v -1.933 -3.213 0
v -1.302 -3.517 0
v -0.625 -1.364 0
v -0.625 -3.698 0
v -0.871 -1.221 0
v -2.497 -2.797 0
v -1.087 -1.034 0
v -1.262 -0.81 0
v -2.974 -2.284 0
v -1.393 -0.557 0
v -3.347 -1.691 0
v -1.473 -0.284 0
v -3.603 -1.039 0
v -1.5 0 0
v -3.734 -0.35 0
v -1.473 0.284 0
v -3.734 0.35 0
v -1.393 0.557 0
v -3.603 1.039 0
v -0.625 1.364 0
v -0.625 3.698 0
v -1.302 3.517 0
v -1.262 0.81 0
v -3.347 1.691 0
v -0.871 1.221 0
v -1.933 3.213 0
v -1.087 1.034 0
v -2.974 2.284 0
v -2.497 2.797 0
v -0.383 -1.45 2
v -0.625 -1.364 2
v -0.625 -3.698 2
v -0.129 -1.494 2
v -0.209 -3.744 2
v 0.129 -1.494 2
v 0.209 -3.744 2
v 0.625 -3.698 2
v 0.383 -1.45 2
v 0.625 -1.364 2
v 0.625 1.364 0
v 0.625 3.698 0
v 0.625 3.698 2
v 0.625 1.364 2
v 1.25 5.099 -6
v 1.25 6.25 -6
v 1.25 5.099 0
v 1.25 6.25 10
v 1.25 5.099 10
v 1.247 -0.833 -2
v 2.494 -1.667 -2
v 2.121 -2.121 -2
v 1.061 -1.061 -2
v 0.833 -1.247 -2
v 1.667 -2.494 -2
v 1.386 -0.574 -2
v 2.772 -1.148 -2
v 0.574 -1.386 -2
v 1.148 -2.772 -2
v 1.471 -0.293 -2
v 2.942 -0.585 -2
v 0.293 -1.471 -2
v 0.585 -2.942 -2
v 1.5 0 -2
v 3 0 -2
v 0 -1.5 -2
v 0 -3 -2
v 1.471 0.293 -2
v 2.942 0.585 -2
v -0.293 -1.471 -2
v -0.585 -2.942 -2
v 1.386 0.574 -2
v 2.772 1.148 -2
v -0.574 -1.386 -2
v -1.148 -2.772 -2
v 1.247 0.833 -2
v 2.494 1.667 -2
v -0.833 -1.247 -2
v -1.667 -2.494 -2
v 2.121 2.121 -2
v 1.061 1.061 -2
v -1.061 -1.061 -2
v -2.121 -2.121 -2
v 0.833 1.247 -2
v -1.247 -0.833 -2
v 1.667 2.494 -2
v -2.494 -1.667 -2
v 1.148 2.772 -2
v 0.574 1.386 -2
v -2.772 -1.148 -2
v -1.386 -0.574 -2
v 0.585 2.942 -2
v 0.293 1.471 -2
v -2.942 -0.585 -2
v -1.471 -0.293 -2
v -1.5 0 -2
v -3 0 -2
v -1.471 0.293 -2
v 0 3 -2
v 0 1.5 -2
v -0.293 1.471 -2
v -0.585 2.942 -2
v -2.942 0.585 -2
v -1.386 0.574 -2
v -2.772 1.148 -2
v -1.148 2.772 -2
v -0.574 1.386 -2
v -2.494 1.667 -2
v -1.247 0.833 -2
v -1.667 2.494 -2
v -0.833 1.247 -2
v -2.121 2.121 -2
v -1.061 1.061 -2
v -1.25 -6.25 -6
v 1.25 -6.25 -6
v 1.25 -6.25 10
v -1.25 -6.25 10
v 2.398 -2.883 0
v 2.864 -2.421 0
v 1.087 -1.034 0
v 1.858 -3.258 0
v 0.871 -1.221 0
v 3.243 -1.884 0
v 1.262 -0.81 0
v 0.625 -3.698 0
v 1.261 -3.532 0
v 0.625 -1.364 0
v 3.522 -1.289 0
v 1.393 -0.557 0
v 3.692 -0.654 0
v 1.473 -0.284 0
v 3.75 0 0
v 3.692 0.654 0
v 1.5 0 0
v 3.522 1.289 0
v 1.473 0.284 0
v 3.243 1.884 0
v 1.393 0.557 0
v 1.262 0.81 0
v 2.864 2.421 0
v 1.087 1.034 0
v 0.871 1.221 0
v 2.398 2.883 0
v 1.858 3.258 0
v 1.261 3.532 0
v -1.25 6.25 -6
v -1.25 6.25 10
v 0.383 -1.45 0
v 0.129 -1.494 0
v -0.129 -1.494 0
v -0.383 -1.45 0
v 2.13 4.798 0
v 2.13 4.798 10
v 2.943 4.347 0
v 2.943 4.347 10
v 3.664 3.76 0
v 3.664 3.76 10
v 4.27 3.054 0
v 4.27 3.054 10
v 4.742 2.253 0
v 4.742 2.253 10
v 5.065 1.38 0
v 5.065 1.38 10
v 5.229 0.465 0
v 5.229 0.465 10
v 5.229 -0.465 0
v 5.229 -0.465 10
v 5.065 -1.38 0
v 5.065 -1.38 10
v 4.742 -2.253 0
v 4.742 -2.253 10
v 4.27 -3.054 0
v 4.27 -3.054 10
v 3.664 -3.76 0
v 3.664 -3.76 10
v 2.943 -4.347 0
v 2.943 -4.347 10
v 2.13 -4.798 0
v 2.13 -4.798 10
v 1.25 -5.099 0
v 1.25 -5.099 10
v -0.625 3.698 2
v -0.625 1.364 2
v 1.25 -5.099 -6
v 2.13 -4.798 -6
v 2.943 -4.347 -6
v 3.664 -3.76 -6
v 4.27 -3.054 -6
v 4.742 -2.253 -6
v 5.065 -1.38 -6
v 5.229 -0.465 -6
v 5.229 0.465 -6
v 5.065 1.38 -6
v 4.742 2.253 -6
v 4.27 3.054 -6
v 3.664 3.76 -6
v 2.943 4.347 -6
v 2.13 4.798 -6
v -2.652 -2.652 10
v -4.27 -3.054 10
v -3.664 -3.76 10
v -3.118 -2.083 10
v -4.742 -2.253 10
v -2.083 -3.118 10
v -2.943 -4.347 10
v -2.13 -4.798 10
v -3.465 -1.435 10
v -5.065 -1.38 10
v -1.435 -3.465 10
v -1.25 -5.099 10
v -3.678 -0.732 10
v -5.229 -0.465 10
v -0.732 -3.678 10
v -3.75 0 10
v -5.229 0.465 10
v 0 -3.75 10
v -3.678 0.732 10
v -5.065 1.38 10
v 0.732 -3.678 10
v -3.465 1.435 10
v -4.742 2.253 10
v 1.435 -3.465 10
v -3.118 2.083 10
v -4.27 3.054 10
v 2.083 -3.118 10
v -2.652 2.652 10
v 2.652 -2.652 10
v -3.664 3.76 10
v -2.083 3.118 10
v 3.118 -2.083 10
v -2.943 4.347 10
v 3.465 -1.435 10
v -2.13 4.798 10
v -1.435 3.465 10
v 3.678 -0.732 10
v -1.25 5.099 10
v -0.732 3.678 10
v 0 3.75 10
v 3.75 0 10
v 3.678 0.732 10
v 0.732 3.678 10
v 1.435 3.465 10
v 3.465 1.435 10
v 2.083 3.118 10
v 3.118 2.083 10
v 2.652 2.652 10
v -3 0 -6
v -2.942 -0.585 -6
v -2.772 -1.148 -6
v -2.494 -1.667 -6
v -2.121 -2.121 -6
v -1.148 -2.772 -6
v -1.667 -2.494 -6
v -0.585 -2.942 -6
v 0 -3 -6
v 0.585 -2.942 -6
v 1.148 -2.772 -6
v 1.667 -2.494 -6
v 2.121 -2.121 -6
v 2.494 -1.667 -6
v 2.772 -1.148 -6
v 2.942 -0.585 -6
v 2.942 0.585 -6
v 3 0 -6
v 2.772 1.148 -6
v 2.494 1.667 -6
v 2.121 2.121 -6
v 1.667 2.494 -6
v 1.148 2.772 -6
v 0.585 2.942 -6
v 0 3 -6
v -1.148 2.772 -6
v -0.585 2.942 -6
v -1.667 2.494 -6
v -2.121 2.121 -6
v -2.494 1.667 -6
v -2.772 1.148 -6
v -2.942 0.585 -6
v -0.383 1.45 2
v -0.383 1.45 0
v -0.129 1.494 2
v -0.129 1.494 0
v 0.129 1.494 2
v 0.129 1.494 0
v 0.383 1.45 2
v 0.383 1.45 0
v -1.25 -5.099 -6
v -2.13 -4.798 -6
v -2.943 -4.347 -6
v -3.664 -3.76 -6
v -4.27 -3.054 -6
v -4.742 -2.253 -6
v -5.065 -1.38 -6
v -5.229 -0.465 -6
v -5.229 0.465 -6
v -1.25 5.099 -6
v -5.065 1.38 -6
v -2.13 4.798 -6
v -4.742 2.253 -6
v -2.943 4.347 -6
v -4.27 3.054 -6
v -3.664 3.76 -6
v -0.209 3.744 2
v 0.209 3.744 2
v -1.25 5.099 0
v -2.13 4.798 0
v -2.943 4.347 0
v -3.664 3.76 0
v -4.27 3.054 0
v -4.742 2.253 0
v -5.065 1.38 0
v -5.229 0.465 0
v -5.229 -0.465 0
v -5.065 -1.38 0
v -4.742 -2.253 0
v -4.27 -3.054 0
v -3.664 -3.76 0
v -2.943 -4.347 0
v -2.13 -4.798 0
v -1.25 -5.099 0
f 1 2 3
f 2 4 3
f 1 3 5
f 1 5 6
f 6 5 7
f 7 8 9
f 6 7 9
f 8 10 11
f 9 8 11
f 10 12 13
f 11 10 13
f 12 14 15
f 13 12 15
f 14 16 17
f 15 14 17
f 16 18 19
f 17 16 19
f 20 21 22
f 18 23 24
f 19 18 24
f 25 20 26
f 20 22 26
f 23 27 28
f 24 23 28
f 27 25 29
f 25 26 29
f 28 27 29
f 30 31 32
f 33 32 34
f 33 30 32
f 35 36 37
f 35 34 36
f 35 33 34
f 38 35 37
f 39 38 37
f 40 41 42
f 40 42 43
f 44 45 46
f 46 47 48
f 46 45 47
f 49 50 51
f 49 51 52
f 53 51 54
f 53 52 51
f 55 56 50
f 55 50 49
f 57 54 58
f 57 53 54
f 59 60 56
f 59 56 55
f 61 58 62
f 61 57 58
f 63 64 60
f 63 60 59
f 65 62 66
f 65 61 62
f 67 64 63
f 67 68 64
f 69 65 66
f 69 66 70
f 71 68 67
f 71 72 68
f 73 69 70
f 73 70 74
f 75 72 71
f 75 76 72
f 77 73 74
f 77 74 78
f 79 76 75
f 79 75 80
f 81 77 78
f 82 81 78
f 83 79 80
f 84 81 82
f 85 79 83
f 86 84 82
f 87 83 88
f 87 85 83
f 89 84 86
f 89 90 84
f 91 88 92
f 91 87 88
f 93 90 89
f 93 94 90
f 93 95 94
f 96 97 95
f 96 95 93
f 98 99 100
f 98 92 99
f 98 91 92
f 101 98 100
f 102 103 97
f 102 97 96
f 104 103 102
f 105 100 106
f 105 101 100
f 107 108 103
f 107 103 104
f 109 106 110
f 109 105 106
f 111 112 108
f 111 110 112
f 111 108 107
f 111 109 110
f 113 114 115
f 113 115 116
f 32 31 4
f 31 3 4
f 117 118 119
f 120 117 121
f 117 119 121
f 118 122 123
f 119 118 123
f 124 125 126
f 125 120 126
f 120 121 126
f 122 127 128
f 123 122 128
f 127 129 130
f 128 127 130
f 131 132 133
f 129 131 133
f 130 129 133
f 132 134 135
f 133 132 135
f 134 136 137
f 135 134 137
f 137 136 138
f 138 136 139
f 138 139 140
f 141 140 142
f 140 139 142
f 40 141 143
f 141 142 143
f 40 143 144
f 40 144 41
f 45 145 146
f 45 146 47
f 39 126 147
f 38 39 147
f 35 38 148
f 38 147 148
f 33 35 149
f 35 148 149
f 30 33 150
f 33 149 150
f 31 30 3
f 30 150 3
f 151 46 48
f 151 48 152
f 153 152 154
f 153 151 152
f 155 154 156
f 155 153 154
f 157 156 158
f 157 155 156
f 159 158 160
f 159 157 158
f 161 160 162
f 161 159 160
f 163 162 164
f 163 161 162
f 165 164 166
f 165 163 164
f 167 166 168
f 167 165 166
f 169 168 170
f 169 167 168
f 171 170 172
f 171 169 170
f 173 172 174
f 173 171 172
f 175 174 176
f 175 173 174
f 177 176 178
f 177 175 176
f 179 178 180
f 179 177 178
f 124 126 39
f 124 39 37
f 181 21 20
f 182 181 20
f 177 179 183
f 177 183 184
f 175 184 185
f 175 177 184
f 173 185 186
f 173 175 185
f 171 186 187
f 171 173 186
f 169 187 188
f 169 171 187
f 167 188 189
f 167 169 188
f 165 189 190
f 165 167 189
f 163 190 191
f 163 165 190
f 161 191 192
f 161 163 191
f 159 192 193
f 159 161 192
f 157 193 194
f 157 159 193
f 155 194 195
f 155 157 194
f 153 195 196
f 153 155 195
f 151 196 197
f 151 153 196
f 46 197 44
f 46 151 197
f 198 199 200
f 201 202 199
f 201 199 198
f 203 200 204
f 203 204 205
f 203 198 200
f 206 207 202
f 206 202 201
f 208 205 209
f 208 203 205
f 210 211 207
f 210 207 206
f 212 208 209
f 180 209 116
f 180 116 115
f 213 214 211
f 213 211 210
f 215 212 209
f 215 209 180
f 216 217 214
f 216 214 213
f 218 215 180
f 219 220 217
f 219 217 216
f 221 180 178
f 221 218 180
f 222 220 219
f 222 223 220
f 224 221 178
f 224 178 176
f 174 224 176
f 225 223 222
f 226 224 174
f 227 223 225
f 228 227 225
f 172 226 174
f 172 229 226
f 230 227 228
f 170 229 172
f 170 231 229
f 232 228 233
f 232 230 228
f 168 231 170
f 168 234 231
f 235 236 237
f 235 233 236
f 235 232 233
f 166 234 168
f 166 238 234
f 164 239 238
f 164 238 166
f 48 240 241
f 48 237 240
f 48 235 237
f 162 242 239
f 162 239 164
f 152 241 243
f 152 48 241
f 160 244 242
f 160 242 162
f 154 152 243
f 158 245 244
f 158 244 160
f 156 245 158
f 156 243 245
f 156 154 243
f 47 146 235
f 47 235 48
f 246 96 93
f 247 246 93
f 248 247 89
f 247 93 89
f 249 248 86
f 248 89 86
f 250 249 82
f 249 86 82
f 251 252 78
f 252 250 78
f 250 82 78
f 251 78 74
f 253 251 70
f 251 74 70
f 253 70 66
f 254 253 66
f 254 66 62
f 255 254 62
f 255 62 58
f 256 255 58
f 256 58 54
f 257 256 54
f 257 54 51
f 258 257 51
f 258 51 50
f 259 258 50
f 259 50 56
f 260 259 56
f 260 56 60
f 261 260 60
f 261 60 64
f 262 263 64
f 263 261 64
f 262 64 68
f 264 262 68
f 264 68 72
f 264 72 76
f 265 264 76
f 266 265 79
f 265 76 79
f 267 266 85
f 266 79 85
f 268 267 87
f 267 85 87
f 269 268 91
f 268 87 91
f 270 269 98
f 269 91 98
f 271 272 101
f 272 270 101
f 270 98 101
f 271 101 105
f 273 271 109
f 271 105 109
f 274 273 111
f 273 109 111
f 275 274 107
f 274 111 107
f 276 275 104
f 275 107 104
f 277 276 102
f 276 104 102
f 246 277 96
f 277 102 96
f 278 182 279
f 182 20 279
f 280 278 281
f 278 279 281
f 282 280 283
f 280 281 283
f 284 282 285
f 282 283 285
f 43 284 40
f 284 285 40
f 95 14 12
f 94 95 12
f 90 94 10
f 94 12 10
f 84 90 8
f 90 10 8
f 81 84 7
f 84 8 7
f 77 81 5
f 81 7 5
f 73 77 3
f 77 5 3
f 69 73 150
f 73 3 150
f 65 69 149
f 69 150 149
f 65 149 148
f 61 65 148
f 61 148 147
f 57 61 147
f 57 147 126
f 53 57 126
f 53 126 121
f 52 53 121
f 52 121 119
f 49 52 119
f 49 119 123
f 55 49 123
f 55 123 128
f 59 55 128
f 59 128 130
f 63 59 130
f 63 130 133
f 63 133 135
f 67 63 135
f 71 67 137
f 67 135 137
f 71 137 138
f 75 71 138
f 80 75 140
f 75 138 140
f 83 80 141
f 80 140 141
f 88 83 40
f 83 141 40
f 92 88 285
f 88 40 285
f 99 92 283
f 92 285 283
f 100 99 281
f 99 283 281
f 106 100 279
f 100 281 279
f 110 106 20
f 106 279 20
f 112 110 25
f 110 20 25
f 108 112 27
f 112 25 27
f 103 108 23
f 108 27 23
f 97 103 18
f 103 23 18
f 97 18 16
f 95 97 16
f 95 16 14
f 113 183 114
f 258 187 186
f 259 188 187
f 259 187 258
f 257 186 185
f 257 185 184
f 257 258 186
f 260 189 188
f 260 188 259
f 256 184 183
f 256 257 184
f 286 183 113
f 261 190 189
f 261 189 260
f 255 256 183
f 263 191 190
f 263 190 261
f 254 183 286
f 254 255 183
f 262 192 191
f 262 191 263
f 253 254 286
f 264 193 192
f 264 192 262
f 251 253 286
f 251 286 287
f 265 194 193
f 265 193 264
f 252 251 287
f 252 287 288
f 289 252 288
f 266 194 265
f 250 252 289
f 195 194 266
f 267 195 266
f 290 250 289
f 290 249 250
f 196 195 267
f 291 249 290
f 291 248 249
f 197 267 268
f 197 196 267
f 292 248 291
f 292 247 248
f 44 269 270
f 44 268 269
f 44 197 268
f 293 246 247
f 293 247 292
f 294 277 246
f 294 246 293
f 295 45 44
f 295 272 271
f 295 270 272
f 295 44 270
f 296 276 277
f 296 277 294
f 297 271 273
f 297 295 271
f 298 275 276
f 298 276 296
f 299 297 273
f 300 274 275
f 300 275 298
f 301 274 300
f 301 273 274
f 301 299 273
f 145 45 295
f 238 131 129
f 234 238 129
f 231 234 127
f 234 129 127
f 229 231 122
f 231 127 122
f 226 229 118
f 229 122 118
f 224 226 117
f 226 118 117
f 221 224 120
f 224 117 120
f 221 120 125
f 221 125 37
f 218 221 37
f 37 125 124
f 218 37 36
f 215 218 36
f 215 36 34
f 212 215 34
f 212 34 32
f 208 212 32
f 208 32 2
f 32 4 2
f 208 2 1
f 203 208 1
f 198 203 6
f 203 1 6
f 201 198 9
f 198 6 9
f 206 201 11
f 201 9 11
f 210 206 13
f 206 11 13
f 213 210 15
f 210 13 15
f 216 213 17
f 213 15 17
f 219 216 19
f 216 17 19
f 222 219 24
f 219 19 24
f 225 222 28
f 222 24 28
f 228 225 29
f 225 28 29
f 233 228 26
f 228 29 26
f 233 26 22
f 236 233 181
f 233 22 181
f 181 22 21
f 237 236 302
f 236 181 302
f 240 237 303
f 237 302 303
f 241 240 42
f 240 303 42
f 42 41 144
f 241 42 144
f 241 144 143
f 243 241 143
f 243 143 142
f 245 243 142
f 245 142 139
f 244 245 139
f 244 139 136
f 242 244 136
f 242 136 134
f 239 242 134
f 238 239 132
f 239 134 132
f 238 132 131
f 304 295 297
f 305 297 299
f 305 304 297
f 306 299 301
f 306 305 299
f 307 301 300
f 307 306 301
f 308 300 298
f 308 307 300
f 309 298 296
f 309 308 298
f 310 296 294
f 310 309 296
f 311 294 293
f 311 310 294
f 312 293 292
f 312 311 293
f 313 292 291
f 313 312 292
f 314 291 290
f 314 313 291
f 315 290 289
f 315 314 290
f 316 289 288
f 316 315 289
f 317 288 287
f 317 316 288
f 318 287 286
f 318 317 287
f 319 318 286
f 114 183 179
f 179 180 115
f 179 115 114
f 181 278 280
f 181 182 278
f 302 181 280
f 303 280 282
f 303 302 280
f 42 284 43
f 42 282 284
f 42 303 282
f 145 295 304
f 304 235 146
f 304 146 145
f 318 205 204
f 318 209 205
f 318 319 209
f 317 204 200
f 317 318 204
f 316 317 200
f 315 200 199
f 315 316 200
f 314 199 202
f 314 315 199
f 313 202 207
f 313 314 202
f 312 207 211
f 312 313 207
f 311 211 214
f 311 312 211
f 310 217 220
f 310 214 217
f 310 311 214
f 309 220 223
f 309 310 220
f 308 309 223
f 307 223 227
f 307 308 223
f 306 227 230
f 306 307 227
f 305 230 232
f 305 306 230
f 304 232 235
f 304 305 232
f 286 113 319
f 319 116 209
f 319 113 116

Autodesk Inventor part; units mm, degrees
ref_plane "YZ Plane" through (0, 0, 0) normal (1, 0, 0) x (0, 1, 0)
ref_plane "XZ Plane" through (0, 0, 0) normal (0, 1, 0) x (-1, 0, 0)
ref_plane "XY Plane" through (0, 0, 0) normal (0, 0, 1) x (1, 0, 0)
sketch "Sketch1" plane through (0, 0, 0) normal (0, 0, 1) x (1, 0, 0)
  circle A0 centre (0, 0) radius 3.75
  line L0 (1.25, -6.25) -> (-1.25, -6.25)
  line L1 (-1.25, -6.25) -> (-1.25, 6.25) construction
  line L2 (-1.25, 6.25) -> (1.25, 6.25)
  line L3 (1.25, 6.25) -> (1.25, -6.25) construction
  circle A1 centre (0, 0) radius 5.25
  line L4 (1.25, -5.099) -> (1.25, -6.25)
  line L5 (-1.25, -6.25) -> (-1.25, -5.099)
  line L6 (-1.25, 6.25) -> (-1.25, 5.099)
  line L7 (1.25, 6.25) -> (1.25, 5.099)
  arc A2 (-1.25, -5.099) -> (1.25, -5.099) centre (0, 0) ccw
  arc A3 (1.25, 5.099) -> (-1.25, 5.099) centre (0, 0) ccw
  point P0 (0, 6.25)
  point P1 (1.25, 0)
  dimension "d1" = 7.5
  dimension "d10" = 2.5
  dimension "d11" = 12.5
  dimension "d12" = 10.5
extrude "Extrusion1" add sketch "Sketch1" along normal blind 10
sketch "Sketch5" plane through (0, 0, 0) normal (0, 0, -1) x (-1, 0, 0)
  circle A0 centre (0, 0) radius 3.75 projected
  circle A1 centre (0, 0) radius 3.75 projected
  line L0 (-1.25, -6.25) -> (-1.25, -5.099) projected
  line L1 (1.25, -6.25) -> (-1.25, -6.25) projected
  line L2 (1.25, -5.099) -> (1.25, -6.25) projected
  arc A2 (1.25, -5.099) -> (1.25, 5.099) centre (0, 0) ccw projected
  line L3 (1.25, 6.25) -> (1.25, 5.099) projected
  line L4 (-1.25, 6.25) -> (1.25, 6.25) projected
  line L5 (-1.25, 5.099) -> (-1.25, 6.25) projected
  arc A3 (-1.25, 5.099) -> (-1.25, -5.099) centre (0, 0) ccw projected
  circle A4 centre (0, 0) radius 1.5
  dimension "d13" = 3
extrude "Extrusion4" add sketch "Sketch5" along normal blind 2 contours A0 | L0 A3 L5 L4 L3 A2 L2 L1
sketch "Sketch6" plane through (0, 0, 0) normal (0, 0, 1) x (1, 0, 0)
  line L0 (0.625, 6.25) -> (-0.625, 6.25)
  line L1 (-0.625, 6.25) -> (-0.625, -6.25) construction
  line L2 (-0.625, -6.25) -> (0.625, -6.25)
  line L3 (0.625, -6.25) -> (0.625, 6.25) construction
  line L4 (-1.25, 6.25) -> (1.25, 6.25) projected
  circle A0 centre (0, 0) radius 1.5 construction
  arc A1 (0.625, 1.3636) -> (-0.625, 1.3636) centre (0, 0) ccw
  arc A2 (-0.625, -1.3636) -> (0.625, -1.3636) centre (0, 0) ccw
  line L5 (0.625, 6.25) -> (0.625, 1.3636)
  line L6 (-0.625, 6.25) -> (-0.625, 1.3636)
  line L7 (0.625, -1.3636) -> (0.625, -6.25)
  line L8 (-0.625, -1.3636) -> (-0.625, -6.25)
  point P0 (0, 0)
  point P1 (0, 6.25)
  point P2 (0.625, 0)
  dimension "d16" = 1.25
extrude "Extrusion5" add sketch "Sketch6" along normal blind 2
sketch "Sketch8" plane through (0, 0, -2) normal (0, 0, -1) x (-1, 0, 0)
  circle A0 centre (0, 0) radius 1.5 projected
  line L0 (-1.25, -5.099) -> (-1.25, -6.25) projected
  line L1 (-1.25, -6.25) -> (1.25, -6.25) projected
  line L2 (1.25, -6.25) -> (1.25, -5.099) projected
  arc A1 (1.25, -5.099) -> (1.25, 5.099) centre (0, 0) ccw projected
  line L3 (1.25, 5.099) -> (1.25, 6.25) projected
  line L4 (1.25, 6.25) -> (-1.25, 6.25) projected
  line L5 (-1.25, 6.25) -> (-1.25, 5.099) projected
  arc A2 (-1.25, 5.099) -> (-1.25, -5.099) centre (0, 0) ccw projected
  circle A3 centre (0, 0) radius 3
  point P0 (0, 0)
  dimension "d22" = 6
extrude "Extrusion6" add sketch "Sketch8" along normal blind 4 contours A2 L5 L4 L3 A1 L2 L1 L0
properties part number "AA042" material "ABS Plastic"
